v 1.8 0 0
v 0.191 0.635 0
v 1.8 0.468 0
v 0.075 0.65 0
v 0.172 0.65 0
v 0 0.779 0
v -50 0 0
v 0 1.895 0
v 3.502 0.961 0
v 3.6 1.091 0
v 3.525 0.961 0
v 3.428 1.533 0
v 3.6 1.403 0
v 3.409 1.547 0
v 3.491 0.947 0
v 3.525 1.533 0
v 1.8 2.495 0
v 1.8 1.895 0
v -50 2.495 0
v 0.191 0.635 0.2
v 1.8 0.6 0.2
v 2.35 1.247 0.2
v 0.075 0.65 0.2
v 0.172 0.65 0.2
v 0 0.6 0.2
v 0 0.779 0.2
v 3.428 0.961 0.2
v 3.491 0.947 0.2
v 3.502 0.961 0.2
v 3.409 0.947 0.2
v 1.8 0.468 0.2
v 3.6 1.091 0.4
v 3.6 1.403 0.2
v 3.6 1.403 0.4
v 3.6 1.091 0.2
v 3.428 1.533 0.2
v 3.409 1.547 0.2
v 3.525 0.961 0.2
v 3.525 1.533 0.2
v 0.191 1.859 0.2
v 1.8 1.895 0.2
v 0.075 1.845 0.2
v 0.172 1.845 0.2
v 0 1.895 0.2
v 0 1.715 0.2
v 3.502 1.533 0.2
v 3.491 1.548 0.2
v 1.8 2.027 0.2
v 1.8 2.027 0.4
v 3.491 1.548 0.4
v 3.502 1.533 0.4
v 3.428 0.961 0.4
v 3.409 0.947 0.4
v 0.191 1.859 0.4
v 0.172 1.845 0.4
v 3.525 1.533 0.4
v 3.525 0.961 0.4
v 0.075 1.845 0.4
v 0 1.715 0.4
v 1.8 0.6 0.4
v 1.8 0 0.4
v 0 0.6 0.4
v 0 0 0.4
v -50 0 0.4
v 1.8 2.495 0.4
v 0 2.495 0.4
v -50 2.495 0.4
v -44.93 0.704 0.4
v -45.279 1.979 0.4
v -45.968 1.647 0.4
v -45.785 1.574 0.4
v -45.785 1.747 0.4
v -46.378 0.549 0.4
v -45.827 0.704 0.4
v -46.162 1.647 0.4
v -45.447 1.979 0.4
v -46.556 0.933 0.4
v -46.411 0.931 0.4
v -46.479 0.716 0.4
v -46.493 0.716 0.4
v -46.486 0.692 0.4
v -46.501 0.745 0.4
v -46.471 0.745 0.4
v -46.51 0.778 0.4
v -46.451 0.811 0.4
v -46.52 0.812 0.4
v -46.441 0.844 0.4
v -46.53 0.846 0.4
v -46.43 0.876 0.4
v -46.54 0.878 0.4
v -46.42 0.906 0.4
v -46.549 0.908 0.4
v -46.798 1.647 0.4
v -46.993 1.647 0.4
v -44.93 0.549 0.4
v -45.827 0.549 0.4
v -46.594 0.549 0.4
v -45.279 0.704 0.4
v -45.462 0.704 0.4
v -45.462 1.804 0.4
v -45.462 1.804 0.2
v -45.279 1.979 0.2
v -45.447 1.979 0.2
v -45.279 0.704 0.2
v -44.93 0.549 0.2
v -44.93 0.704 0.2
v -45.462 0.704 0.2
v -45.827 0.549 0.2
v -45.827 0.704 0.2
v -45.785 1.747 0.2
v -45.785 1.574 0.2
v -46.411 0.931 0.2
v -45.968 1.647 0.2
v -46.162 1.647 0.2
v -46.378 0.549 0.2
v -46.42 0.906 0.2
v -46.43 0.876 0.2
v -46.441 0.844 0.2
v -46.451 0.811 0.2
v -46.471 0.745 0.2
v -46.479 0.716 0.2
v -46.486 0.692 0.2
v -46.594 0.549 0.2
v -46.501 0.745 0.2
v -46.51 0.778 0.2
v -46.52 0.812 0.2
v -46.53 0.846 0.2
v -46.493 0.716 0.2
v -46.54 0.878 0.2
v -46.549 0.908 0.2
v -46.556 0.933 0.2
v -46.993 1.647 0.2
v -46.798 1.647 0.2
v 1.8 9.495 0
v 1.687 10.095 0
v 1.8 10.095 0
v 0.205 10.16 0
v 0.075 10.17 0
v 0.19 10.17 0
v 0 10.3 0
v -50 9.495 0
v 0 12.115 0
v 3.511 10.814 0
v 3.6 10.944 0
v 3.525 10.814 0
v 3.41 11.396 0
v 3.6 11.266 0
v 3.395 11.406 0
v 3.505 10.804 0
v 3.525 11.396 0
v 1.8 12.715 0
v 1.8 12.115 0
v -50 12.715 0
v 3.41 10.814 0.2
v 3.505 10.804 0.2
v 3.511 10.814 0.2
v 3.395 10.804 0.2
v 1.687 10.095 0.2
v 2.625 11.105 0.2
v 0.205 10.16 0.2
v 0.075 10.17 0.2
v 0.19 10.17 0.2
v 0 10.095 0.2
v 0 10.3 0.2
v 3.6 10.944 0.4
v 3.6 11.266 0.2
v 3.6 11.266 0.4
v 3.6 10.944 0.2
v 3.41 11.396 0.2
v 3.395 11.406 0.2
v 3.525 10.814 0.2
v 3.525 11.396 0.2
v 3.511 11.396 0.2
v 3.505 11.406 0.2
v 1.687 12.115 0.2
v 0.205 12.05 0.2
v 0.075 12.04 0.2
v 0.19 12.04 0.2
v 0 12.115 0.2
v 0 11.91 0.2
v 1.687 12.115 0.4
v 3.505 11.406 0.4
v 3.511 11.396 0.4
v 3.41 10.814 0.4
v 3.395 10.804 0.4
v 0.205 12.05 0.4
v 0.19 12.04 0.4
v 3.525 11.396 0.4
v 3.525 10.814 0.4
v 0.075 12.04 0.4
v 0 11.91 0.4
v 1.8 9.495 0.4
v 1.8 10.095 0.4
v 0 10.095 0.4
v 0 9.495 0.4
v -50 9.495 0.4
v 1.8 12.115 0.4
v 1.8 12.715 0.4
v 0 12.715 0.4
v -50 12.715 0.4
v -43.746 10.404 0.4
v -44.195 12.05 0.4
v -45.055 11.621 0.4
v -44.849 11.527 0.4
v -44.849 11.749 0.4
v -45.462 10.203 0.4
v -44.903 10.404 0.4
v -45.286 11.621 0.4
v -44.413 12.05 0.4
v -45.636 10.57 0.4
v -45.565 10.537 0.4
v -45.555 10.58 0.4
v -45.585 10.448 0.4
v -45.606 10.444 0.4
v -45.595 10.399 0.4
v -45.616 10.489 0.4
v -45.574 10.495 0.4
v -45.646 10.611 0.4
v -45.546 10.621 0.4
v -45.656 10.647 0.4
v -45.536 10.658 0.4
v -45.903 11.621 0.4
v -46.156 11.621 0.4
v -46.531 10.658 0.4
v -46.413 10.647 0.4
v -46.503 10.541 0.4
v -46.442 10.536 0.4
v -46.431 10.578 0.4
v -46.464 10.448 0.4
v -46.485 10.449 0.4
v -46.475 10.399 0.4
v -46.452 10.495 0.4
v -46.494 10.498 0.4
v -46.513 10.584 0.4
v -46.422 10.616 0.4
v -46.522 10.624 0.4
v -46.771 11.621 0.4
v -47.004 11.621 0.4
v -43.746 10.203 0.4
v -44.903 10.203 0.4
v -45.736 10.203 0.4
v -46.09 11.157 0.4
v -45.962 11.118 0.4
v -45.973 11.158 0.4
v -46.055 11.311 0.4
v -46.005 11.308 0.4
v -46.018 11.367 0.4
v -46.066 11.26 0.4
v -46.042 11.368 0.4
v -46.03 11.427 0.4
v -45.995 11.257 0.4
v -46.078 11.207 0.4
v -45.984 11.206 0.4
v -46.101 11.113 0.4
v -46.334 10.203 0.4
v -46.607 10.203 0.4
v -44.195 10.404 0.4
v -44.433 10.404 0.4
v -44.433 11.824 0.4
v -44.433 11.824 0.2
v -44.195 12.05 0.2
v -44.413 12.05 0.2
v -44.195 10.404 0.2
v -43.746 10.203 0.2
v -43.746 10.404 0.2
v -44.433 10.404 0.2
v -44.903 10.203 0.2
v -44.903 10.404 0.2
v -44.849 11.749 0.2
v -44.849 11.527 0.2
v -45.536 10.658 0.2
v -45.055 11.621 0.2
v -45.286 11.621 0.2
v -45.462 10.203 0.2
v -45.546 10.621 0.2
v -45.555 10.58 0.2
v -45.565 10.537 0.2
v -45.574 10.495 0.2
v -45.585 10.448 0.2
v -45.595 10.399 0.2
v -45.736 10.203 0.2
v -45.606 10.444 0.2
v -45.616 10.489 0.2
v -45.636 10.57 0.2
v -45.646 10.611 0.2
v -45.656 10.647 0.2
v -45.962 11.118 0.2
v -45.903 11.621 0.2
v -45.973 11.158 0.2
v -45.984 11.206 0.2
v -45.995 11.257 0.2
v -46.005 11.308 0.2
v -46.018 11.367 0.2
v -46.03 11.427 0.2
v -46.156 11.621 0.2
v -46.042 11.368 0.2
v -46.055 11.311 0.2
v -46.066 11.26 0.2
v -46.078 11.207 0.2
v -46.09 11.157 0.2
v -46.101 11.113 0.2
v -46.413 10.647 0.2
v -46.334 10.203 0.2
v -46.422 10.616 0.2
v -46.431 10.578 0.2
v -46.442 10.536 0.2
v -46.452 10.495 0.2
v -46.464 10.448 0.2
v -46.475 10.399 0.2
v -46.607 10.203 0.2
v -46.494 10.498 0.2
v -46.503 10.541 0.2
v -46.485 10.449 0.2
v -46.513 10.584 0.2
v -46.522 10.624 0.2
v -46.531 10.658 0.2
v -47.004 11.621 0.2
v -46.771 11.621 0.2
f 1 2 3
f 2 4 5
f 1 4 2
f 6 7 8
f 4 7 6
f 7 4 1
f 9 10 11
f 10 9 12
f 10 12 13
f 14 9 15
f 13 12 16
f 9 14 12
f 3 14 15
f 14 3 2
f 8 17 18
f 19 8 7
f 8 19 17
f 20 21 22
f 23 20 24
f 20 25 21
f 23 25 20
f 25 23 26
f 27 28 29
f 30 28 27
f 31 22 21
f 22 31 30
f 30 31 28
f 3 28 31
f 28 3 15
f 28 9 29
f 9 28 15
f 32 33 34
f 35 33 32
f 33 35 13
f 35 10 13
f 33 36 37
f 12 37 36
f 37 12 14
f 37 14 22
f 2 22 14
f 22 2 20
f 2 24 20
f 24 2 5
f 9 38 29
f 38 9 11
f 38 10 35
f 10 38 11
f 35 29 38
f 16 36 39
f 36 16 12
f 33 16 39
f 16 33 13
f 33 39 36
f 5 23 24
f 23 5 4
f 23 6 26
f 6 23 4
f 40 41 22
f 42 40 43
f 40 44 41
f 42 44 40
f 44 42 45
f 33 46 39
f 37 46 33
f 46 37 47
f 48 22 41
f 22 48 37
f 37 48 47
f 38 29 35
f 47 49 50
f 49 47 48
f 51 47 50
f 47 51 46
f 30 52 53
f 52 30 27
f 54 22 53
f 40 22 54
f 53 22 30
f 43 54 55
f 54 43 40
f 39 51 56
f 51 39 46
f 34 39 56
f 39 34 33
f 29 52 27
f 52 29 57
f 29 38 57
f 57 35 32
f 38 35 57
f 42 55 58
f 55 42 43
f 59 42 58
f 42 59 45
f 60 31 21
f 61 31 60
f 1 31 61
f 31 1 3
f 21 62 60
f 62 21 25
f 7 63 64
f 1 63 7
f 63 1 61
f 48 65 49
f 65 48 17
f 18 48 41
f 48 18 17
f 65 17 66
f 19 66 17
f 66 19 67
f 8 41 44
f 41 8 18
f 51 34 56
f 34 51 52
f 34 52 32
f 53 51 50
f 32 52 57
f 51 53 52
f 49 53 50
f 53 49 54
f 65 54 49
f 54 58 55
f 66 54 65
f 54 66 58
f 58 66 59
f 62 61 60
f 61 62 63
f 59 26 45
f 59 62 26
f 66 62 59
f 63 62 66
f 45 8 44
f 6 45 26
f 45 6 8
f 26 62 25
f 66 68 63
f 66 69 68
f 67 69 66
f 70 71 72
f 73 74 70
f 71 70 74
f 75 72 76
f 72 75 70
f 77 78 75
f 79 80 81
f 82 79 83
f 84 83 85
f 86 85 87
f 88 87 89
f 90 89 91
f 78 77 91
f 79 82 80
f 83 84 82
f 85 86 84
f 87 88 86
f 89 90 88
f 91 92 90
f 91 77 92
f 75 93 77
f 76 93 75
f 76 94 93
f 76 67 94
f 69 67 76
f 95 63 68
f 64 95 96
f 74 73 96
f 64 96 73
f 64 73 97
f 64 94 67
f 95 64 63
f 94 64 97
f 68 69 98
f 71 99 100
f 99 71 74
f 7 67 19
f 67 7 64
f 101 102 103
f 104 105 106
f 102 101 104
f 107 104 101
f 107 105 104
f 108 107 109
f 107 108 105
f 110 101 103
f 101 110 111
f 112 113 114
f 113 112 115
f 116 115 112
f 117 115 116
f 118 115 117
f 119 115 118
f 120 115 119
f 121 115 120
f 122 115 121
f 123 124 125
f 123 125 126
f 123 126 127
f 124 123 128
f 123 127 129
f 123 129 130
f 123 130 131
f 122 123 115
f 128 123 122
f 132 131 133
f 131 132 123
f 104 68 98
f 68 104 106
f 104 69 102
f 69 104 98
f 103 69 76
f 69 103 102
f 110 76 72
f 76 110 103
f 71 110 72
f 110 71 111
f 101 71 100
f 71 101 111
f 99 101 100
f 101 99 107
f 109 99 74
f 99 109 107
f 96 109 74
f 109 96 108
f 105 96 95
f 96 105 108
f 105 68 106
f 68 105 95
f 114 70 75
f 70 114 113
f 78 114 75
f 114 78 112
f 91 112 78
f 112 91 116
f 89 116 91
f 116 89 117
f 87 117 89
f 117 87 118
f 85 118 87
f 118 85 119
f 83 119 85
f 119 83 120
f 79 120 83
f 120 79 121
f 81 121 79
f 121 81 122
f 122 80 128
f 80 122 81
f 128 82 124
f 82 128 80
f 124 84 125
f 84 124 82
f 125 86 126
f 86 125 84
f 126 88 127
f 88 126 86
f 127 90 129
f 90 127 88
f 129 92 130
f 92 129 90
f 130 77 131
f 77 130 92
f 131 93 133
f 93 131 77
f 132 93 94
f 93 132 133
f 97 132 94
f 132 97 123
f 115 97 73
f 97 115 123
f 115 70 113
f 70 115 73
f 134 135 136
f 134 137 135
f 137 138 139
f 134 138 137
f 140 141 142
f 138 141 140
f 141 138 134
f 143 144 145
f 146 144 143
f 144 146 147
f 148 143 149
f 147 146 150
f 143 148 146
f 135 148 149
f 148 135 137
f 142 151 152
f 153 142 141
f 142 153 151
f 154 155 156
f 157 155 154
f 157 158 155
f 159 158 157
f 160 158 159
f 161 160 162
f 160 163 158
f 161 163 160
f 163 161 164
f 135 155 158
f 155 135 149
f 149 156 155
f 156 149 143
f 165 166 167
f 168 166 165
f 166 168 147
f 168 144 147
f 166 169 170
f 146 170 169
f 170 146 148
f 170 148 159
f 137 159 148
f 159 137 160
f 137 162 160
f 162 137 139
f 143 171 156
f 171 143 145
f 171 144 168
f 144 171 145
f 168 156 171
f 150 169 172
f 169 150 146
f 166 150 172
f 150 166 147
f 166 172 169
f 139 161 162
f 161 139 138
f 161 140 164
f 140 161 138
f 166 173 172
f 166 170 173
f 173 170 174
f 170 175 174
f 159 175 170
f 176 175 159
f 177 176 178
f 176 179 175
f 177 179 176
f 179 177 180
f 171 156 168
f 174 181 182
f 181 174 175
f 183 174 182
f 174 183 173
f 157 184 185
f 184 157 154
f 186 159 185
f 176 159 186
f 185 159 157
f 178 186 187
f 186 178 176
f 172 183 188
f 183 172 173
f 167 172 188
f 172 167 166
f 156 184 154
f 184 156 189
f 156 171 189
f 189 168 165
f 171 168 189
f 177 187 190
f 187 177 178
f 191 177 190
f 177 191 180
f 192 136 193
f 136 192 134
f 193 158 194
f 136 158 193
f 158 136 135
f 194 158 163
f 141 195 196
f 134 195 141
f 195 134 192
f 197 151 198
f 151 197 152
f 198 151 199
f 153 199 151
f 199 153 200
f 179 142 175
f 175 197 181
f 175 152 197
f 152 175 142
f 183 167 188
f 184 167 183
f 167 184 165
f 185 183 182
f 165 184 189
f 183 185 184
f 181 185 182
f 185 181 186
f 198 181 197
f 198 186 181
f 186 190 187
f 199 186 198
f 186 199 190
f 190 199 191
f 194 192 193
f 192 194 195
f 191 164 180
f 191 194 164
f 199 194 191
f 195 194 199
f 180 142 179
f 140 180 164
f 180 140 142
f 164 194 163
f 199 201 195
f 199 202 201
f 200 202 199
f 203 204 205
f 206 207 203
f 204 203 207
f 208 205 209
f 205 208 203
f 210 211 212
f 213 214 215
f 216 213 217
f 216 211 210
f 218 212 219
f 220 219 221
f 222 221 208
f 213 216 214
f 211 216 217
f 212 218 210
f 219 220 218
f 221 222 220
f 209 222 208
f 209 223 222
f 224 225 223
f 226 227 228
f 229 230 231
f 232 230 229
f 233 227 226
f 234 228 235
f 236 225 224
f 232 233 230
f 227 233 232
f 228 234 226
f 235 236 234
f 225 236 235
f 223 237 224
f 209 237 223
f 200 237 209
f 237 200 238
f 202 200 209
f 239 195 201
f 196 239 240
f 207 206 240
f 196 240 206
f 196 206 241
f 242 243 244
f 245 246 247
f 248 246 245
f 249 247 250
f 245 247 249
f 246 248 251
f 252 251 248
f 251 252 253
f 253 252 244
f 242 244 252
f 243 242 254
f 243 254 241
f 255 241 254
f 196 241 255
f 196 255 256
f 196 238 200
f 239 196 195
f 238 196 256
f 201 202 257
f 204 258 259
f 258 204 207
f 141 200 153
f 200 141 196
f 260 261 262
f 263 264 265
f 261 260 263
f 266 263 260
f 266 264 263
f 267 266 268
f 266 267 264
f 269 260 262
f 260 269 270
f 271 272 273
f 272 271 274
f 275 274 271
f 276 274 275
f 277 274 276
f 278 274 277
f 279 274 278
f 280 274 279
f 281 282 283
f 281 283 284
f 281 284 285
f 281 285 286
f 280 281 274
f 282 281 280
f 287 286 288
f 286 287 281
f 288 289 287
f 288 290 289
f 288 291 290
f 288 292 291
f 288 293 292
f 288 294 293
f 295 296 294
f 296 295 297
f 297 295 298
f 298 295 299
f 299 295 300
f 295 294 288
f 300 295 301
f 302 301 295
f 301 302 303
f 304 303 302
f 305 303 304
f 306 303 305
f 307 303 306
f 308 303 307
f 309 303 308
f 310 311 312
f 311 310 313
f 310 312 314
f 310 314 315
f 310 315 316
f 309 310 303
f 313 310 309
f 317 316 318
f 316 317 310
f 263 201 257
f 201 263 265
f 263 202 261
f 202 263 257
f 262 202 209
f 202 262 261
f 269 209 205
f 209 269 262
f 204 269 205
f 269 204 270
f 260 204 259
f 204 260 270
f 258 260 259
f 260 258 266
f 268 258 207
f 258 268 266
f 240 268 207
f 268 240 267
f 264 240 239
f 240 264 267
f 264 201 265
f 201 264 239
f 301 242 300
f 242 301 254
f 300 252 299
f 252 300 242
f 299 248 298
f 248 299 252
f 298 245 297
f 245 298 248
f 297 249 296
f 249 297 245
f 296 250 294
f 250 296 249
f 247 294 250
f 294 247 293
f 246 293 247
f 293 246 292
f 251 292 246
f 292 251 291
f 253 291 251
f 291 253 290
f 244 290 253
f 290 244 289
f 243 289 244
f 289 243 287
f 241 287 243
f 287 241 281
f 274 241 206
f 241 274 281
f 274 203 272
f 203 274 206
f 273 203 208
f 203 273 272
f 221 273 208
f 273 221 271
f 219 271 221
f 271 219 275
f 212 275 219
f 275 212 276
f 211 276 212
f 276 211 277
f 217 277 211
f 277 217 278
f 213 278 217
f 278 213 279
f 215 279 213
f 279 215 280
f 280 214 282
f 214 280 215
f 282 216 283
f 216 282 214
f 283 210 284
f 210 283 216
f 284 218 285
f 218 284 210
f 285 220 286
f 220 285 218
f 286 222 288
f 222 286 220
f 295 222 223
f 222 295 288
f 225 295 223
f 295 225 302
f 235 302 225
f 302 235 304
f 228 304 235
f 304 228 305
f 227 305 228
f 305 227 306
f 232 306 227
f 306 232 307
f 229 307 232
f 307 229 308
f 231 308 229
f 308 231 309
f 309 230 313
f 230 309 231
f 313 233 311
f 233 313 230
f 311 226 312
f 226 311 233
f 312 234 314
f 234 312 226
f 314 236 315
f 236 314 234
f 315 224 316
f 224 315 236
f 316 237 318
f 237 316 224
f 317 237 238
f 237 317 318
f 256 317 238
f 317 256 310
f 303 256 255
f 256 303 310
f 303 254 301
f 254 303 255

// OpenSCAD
sample_points = [
    [[1.2, 3.6], "v"],
    [[1.8, 3.6], "w"],
    [[2.4, 3.6], "x"],
    [[3.0, 3.6], "y"],
    [[3.6, 3.6], "z"],
    ];


tpla = true; pp = false; material = tpla;

n=1;
N = len(sample_points);

wmin = .3;
h = .2;

r = .15;

tot_l = 50;
rep_z = 1;//round(5 / (2*h));
rep_y = 1;//5;

brim = 7;
outer_brim = 20;
side_brim = 30;


specimen_numbers = true;


$fn = 6;

wa = 2 * wmin;



module leg(wa,wb,da,db,d,L,h)
{
    w = wa + wb;
    M = L - 2*r;
    d = da + db;
    da = wa * d/w;
    db = wb * d/w;
    ea = (wa - 2*r) * d/w;
    eb = (wb - 2*r) * d/w;
    f = 2*r * d/w;
    s = r * w/d;
    t = sqrt(r^2 - s^2);
    
    translate([r,.5*f,0])
    difference()
    {
        union()
        {
            linear_extrude(h+.0001)
            polygon([
            [-r,-f],
            [-t,-f+s],
            [M+t,.5*d-s],
            [M+r,.5*d],
            [M+r,.5*d+ea],
            [M-t,.5*d+ea+s],
            [t,ea+f-s],
            [-r,ea+f],
            ]);
            
            translate([M,.5*d,0]) cylinder(r=r, h = h);
            translate([M,.5*d+ea,0]) cylinder(r=r, h = h);
        }
        
        translate([0,-f,-.1]) cylinder(r=r, h = 2*h);
        translate([0,ea+f,-.1]) cylinder(r=r, h = 2*h);
    }
}

module cell(wa,wb,da,db,d,L,h)
{
    leg(wa,wb,da,db,d,L,h);
    translate([0,d+da,h])
    scale([1,-1,1])
    leg(wa,wb,da,db,d,L,h);
}
module interface_a(wa,wb,da,db,d,L,h, tot_w,tot_h)
{
    for (z = [0:rep_z-1])
        for (y = [0:rep_y-1])
        {
            translate([0,d*y,z*2*h]) cell(wa,wb,da,db,d,L,h);
        }
    for ( i = [0,1])
        translate([0,i*(tot_w - 2*wmin),0])
        cube([.5*L,2*wmin,tot_h]);
}

module mat_a(wa,wb,da,db,d,L,h, tot_w,tot_h,tot_l)
{
    intersection()
    {
        cube([L+tot_l,tot_w,tot_h-.0001]);
        interface_a(wa,wb,da,db,d,L,h, tot_w,tot_h);
    }
    translate([-tot_l,0,0])
    cube([tot_l+.0001,tot_w,tot_h]);
}

module mat_b(wa,wb,da,db,d,L,h, tot_w,tot_h,tot_l)
{
    difference()
    {
        translate([.0001,0,0.0001])
        cube([L+tot_l,tot_w,tot_h-.0001]);
        interface_a(wa,wb,da,db,d,L,h, tot_w,tot_h);
    }
}

function get_d(M, w) = 2*M*w / sqrt(4*M^2-w^2);

module sample(tag, wb, L)
{
    w = wa + wb;
    M = L - 2*r;
    d = get_d(M, w);
    da = wa * d/w;
    db = wb * d/w;

    tot_w = rep_y*d+da;
    tot_h = rep_z*2*h;
    echo("total width", tot_w);
    echo("total height", tot_h);

    if (material == tpla)
    {
        difference()
        {
            mat_a(wa,wb,da,db,d,L,h, tot_w,tot_h,tot_l);
            translate([-tot_l + 3, tot_w / 2, tot_h-.2])
            linear_extrude(1.0)
            text(tag,halign="left", valign="center",size = min(5,6*.1*(tot_w)));
        }
    }
    else
    {
        mat_b(wa,wb,da,db,d,L,h, tot_w,tot_h,tot_l);
    }
}



module samples(from, till)
{
    echo((from + N - round((n-1) / 5 * N)) % N);
    wb = sample_points[(from + N - round((n-1) / 5 * N)) % N][0][0];
    L = sample_points[(from + N - round((n-1) / 5 * N)) % N][0][1];
    w = wa + wb;
    M = L - 2*r;
    d = get_d(M,w);
    echo("d=",d);
    da = wa * d/w;
    tot_w = rep_y*d+da;
    echo("wb, L", wb, L);
    sample(str(sample_points[(from + N - round((n-1) / 5 * N)) % N][1], n)
        , wb
        , L);
    if (till > from)
    {
        translate([0, brim + tot_w,0])
        samples(from + 1, till);
    }
}

samples(0, 1);//N-1);

if (false)
{
    L = 3;
    h = .2;
    wa = 1;
    wb = 2;
    w = wa + wb;
    M = L - 2*r;
    d = get_d(M, w);
    da = wa * d/w;
    db = d - da;
    leg(wa,wb,da,db,d,L,h);
}
